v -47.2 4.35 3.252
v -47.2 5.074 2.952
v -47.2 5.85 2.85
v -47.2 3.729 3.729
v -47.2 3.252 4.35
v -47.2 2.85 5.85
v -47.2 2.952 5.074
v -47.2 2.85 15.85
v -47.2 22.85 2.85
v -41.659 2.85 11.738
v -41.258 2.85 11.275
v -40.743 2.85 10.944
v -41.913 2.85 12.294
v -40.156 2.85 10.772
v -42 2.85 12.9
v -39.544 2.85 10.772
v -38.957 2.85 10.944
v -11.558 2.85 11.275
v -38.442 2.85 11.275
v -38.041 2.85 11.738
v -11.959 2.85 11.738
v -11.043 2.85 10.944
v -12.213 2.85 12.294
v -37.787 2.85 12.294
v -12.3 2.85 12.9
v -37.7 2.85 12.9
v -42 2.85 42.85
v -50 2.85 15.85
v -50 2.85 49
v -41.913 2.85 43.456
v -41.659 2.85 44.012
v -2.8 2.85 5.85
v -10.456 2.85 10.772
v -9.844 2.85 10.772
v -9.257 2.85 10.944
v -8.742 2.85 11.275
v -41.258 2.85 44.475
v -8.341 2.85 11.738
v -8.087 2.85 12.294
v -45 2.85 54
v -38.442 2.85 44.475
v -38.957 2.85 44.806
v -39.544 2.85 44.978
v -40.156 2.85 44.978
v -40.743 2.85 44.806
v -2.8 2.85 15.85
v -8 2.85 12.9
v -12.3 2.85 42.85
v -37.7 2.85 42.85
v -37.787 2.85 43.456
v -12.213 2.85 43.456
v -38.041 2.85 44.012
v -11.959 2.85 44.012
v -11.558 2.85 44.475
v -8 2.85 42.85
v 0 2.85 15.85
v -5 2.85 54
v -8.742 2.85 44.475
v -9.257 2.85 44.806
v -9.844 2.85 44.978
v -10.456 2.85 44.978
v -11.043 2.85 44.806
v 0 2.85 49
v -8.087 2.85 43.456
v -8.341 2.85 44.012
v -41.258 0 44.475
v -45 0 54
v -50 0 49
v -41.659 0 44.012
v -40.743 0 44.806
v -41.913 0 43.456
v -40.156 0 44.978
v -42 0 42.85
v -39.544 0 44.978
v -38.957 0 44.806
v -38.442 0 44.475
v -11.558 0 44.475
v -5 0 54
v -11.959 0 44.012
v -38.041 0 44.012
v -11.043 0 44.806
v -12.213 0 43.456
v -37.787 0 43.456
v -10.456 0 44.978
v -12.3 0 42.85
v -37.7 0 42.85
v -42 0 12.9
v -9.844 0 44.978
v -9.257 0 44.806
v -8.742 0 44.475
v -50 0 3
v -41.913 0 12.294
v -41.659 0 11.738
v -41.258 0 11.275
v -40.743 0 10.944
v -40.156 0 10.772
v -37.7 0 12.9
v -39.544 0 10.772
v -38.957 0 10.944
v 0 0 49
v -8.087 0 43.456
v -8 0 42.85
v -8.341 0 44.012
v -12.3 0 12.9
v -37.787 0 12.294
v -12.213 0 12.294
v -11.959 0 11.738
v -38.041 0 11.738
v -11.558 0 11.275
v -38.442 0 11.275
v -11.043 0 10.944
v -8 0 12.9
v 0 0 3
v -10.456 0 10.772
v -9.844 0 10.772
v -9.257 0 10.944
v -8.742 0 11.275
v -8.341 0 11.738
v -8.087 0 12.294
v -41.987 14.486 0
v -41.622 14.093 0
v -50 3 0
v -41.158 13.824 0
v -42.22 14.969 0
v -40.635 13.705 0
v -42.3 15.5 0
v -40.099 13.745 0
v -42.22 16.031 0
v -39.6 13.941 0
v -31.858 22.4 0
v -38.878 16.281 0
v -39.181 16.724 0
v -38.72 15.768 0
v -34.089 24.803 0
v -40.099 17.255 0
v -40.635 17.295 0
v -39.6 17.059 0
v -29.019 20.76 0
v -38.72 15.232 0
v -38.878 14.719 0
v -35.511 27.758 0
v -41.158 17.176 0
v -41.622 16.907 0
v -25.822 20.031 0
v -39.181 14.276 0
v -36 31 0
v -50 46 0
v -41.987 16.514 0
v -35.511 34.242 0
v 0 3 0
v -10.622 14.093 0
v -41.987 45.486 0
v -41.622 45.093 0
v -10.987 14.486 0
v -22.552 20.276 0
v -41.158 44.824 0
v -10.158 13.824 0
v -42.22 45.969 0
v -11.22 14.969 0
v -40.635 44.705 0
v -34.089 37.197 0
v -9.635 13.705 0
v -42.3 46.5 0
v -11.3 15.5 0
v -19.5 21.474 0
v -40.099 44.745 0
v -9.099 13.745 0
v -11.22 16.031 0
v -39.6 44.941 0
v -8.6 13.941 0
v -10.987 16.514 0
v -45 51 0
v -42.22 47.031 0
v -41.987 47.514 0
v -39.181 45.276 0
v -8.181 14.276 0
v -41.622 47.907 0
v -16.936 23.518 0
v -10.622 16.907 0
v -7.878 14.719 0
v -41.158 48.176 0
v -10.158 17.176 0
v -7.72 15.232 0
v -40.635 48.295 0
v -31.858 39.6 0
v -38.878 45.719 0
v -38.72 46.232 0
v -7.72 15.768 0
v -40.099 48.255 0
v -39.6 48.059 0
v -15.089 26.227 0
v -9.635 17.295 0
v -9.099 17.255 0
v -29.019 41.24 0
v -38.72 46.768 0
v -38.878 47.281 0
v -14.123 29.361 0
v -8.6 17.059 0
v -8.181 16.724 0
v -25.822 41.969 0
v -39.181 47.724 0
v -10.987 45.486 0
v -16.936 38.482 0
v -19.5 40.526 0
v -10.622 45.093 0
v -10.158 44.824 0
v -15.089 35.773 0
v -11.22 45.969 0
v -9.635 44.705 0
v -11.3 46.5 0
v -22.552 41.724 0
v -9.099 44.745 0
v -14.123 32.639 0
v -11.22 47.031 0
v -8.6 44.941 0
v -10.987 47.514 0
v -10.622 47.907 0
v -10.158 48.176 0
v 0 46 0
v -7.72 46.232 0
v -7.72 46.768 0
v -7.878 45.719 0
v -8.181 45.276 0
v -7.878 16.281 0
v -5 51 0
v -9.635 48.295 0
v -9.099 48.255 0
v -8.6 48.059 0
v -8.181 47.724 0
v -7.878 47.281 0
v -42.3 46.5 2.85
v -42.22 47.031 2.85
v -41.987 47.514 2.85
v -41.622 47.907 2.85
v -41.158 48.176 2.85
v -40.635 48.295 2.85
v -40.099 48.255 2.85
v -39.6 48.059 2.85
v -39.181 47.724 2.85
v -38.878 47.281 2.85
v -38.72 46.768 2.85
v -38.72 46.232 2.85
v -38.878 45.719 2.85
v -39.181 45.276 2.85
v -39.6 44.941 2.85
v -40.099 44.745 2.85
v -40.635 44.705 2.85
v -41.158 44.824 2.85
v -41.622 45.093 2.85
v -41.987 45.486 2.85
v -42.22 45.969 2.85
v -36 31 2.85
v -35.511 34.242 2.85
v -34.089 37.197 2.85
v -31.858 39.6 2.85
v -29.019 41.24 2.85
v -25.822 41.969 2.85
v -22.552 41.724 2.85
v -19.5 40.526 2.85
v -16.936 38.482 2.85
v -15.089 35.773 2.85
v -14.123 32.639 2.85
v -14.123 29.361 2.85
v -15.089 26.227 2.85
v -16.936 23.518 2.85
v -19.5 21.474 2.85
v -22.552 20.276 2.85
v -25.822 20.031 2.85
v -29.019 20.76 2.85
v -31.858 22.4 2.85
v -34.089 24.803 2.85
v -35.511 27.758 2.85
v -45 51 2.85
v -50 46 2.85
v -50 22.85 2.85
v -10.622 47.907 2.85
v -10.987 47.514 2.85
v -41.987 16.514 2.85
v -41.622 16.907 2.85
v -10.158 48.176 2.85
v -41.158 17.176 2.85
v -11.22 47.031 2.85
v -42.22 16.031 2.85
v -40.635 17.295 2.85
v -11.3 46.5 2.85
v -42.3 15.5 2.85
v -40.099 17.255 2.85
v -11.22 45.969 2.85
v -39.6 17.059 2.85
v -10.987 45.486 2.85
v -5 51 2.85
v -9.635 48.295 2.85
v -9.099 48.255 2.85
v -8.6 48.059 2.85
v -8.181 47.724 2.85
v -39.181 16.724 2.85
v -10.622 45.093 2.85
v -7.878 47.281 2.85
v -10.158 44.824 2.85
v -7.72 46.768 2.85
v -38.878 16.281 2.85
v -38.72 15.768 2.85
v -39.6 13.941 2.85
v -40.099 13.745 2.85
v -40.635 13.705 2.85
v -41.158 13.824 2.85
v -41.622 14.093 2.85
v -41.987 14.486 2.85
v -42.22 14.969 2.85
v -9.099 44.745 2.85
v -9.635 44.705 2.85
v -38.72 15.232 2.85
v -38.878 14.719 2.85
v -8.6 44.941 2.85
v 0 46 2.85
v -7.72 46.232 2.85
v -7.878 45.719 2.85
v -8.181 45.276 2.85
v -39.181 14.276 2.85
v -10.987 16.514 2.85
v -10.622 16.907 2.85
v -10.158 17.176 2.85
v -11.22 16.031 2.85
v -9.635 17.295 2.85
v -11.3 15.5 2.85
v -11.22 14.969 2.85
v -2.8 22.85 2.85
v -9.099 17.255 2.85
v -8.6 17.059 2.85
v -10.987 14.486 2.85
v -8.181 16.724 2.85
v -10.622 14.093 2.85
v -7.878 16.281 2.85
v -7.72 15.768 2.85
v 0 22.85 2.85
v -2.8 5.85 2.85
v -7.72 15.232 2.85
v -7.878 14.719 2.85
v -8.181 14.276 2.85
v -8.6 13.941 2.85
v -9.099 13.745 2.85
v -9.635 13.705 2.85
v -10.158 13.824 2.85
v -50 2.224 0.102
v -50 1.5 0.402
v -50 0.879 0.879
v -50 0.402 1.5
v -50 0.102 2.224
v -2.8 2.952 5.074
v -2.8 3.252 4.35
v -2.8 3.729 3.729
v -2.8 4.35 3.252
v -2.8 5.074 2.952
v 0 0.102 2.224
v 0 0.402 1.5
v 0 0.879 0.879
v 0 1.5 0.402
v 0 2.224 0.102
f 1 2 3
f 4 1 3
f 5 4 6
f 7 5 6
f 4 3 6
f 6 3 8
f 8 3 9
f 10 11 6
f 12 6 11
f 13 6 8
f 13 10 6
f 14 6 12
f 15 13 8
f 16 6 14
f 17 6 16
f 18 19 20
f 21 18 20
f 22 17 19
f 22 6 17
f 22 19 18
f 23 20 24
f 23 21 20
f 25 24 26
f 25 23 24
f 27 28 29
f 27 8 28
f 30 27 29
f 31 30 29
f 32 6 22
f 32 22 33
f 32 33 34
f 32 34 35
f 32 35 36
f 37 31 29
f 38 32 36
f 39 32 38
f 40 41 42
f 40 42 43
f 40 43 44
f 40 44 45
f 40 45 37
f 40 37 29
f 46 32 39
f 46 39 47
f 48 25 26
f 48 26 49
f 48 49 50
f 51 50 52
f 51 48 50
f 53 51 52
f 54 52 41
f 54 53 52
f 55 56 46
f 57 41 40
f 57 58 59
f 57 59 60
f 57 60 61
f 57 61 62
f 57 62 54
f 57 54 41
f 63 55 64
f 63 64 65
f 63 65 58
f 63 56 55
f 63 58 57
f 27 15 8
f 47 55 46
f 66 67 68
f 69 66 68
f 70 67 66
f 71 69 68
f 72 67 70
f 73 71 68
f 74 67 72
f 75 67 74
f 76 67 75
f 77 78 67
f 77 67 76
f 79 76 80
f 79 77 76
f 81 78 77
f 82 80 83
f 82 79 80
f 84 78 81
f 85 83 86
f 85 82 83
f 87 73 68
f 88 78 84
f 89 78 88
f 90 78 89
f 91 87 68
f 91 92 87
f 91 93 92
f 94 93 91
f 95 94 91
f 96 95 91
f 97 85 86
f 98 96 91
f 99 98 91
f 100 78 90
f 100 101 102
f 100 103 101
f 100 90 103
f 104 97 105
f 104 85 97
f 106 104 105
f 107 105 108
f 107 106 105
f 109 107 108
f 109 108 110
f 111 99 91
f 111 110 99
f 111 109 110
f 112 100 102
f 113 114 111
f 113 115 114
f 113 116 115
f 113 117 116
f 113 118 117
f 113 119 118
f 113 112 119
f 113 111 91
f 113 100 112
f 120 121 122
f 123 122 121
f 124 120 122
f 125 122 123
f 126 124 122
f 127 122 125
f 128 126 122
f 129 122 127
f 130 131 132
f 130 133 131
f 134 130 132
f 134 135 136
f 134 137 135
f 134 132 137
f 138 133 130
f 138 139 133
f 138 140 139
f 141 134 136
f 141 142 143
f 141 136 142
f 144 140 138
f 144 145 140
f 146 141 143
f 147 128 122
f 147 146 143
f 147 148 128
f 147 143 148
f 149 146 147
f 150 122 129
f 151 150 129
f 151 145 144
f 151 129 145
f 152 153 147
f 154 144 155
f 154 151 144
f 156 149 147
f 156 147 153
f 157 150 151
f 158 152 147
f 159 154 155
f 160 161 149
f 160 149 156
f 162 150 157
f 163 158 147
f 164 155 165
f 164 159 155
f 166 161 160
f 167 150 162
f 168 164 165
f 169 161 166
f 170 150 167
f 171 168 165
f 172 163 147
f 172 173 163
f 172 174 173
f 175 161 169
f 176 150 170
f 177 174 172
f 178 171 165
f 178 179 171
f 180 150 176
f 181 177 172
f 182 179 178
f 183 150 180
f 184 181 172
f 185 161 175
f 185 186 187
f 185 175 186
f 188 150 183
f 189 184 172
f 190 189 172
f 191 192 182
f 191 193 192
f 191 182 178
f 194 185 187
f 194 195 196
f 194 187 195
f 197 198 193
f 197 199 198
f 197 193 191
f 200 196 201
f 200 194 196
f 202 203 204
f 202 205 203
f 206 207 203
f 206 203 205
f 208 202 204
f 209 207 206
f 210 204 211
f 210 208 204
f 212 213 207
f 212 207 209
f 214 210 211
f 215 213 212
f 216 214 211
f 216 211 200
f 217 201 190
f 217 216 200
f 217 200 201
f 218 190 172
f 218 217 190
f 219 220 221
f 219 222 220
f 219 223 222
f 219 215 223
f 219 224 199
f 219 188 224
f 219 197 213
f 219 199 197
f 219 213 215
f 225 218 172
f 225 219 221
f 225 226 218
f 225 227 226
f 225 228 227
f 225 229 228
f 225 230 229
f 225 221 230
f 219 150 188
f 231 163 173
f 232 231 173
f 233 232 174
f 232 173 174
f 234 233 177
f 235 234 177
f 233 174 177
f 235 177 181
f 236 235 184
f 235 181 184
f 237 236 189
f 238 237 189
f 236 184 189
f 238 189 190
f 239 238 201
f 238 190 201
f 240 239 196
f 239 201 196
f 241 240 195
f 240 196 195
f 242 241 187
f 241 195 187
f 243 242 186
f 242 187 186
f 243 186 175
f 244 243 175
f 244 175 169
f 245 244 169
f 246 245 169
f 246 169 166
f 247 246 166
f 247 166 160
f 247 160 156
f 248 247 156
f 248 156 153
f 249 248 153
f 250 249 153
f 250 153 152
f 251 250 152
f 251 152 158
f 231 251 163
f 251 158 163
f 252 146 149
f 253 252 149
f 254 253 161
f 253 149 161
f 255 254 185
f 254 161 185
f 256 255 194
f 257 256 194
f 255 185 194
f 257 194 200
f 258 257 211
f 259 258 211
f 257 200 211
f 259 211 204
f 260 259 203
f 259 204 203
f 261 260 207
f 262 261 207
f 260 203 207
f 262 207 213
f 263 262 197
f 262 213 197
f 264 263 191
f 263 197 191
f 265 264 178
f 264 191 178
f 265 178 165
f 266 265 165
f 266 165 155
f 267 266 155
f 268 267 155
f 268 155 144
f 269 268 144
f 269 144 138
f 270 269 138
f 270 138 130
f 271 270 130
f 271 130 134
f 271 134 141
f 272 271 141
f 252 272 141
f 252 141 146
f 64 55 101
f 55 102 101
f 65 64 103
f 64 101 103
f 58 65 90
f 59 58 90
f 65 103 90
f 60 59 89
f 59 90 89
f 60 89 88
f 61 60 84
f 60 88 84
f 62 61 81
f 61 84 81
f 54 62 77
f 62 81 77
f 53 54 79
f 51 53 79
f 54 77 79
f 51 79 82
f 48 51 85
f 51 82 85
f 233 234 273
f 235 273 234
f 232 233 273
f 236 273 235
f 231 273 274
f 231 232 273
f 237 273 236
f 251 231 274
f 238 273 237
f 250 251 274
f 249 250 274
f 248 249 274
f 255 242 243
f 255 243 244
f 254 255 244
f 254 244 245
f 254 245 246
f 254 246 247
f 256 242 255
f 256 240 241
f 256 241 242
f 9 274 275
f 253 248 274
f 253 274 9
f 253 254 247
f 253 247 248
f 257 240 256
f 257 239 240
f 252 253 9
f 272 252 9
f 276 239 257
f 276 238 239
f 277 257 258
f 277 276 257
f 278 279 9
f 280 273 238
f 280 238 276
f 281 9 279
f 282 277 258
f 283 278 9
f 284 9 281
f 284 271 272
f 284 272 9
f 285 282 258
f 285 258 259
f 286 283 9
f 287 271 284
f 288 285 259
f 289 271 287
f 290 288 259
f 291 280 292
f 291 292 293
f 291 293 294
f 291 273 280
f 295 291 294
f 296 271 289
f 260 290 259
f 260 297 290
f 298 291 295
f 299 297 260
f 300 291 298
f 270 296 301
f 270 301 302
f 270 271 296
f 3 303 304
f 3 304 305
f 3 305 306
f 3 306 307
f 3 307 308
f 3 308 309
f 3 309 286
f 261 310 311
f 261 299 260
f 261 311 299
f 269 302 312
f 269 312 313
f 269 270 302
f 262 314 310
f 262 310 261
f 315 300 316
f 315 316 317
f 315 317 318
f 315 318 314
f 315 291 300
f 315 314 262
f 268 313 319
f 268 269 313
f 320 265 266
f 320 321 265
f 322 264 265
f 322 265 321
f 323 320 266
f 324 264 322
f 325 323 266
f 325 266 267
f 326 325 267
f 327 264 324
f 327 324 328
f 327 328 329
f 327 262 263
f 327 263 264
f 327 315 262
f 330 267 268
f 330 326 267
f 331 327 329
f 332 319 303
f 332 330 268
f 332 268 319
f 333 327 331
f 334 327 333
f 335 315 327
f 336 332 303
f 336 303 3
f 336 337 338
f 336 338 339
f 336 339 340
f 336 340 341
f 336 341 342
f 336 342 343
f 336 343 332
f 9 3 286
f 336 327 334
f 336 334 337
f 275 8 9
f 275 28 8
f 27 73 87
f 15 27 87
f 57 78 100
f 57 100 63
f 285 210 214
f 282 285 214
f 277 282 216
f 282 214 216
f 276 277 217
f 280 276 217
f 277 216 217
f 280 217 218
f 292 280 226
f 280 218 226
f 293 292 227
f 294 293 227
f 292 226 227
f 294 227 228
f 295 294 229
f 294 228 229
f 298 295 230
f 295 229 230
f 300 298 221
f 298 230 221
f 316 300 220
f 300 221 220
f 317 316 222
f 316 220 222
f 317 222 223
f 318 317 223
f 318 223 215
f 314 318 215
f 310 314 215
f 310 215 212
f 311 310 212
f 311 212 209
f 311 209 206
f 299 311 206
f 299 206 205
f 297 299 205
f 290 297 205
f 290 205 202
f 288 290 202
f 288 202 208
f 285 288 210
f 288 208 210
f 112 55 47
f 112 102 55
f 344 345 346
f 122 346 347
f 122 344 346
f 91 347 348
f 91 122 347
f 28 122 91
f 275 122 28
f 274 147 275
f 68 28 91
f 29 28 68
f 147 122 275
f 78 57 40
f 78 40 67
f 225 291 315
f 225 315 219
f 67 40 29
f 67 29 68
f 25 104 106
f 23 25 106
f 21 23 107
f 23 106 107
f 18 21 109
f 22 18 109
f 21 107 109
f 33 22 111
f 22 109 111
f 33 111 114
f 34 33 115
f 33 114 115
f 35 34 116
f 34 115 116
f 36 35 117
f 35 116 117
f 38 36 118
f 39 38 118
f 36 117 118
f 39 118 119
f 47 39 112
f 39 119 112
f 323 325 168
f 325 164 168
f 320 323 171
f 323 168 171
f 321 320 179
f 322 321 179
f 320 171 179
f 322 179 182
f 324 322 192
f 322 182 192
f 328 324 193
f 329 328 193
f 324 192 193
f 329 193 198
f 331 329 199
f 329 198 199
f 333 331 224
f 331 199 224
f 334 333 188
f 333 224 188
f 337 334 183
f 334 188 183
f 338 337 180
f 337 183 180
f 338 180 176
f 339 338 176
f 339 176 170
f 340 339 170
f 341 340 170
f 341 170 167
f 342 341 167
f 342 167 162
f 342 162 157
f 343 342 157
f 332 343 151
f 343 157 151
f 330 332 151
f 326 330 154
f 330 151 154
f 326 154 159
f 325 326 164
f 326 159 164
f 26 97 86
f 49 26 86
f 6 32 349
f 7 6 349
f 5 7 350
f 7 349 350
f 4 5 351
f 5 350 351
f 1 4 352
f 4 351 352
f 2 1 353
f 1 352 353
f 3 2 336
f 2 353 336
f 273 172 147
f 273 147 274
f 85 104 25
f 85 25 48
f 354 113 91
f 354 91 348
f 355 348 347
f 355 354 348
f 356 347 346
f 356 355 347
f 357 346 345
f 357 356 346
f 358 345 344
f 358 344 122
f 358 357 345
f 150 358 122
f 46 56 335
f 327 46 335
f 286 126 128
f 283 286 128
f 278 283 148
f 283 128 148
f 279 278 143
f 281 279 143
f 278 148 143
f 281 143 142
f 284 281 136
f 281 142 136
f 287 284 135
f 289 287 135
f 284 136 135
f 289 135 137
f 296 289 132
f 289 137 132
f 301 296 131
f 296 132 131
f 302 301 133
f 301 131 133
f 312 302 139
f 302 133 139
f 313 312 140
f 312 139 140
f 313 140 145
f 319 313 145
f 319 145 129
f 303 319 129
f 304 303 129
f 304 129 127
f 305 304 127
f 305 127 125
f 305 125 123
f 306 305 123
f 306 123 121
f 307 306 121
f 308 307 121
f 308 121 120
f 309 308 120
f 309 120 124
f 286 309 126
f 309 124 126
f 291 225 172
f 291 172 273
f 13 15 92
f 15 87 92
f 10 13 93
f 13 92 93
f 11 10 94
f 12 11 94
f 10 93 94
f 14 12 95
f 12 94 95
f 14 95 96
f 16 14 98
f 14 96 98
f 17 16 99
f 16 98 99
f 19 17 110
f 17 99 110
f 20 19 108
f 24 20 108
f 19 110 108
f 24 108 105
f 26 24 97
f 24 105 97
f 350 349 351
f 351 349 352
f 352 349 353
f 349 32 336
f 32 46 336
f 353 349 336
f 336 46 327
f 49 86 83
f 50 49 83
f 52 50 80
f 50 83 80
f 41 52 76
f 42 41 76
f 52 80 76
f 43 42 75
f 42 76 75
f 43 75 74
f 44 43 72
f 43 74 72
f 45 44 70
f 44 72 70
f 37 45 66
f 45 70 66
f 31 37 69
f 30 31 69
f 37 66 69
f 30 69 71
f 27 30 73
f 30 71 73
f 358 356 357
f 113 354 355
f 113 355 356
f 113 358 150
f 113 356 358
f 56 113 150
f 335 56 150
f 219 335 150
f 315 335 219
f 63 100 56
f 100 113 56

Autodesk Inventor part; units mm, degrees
ref_plane "YZ Plane" through (0, 0, 0) normal (1, 0, 0) x (0, 1, 0)
ref_plane "XZ Plane" through (0, 0, 0) normal (0, 1, 0) x (-1, 0, 0)
ref_plane "XY Plane" through (0, 0, 0) normal (0, 0, 1) x (1, 0, 0)
sketch "Sketch1" plane through (0, 0, 0) normal (1, 0, 0) x (0, 1, 0)
  line L0 (3, 0) -> (51, 0)
  line L1 (51, 0) -> (51, 2.85)
  line L2 (51, 2.85) -> (5.85, 2.85)
  line L3 (2.85, 5.85) -> (2.85, 54)
  line L4 (2.85, 54) -> (0, 54)
  line L5 (0, 54) -> (0, 3)
  arc A0 (0, 3) -> (3, 0) centre (3, 3) ccw
  arc A1 (2.85, 5.85) -> (5.85, 2.85) centre (5.85, 5.85) ccw
  point P0 (0, 0)
  dimension "d0" = 51
  dimension "d1" = 2.85
  dimension "d2" = 2.85
  dimension "d3" = 54
  dimension "d4" = 3
extrude "Extrusion1" add sketch "Sketch1" against normal blind 50
sketch "Sketch2" plane through (0, 0, 0) normal (1, 0, 0) x (0, 0, -1)
  line L0 (-54, 2.85) -> (-54, 0) projected
  line L1 (-54, 0) -> (-3, 0) projected
  arc A0 (-3, 0) -> (0, 3) centre (-3, 3) ccw projected
  line L2 (0, 3) -> (0, 51) projected
  line L3 (0, 51) -> (-2.85, 51) projected
  line L4 (-2.85, 51) -> (-2.85, 5.85) projected
  arc A1 (-5.85, 2.85) -> (-2.85, 5.85) centre (-5.85, 5.85) ccw projected
  line L5 (-5.85, 2.85) -> (-54, 2.85) projected
  line L6 (-5.85, 2.85) -> (-54, 2.85) projected
  line L7 (-15.85, 2.85) -> (-2.85, 22.85)
  line L8 (-2.85, 51) -> (-2.85, 5.85) projected
  point P0 (0, 0)
  point P1 (-2.85, 22.85)
  dimension "d7" = 20
  dimension "d8" = 13
extrude "Extrusion2" add sketch "Sketch2" against normal blind 2.8 contours L7 L4 A1 L5
sketch "Sketch3" plane through (-50, 0, 0) normal (-1, 0, 0) x (0, 0, 1)
  line L0 (2.85, 5.85) -> (2.85, 22.85) projected
  arc A0 (2.85, 5.85) -> (5.85, 2.85) centre (5.85, 5.85) ccw projected
  line L1 (15.85, 2.85) -> (5.85, 2.85) projected
  line L2 (15.85, 2.85) -> (2.85, 22.85) projected
  point P0 (0, 0)
extrude "Extrusion3" add sketch "Sketch3" against normal blind 2.8
sketch "Sketch4" plane through (0, 3, 0) normal (0, 0, -1) x (-1, 0, 0)
  line L0 (0, 48) -> (50, 48) construction
  line L1 (25, 48) -> (25, -3) construction
  line L2 (0, -3) -> (50, -3) construction
  line L3 (0, 48) -> (0, 19.85) construction
  line L4 (0, 28) -> (50, 28) construction
  line L5 (50, 48) -> (50, 0) construction
  circle A0 centre (25, 28) radius 11
  line L6 (9.5, 43.5) -> (40.5, 43.5) construction
  line L7 (40.5, 43.5) -> (40.5, 12.5) construction
  line L8 (40.5, 12.5) -> (9.5, 12.5) construction
  line L9 (9.5, 12.5) -> (9.5, 43.5) construction
  circle A1 centre (9.5, 43.5) radius 1.8
  circle A2 centre (40.5, 43.5) radius 1.8
  circle A3 centre (40.5, 12.5) radius 1.8
  circle A4 centre (9.5, 12.5) radius 1.8
  dimension "d13" = 20
  dimension "d14" = 22
  dimension "d15" = 31
  dimension "d16" = 31
  dimension "d17" = 3.6
  dimension "d18" = 3.6
  dimension "d19" = 3.6
  dimension "d20" = 3.6
  dimension "d21" = 15.5
  dimension "d22" = 15.5
extrude "Extrusion4" cut sketch "Sketch4" against normal up to next
sketch "Sketch5" plane through (0, 0, 3) normal (0, -1, 0) x (1, 0, 0)
  line L0 (0, 51) -> (-50, 51) construction
  line L1 (-38.7, -3) -> (-42.3, -3) construction
  line L2 (-39.85, 51) -> (-39.85, -3.09) construction
  line L3 (0, -3) -> (-50, -3) construction
  line L4 (-50, 0) -> (-50, 51) construction
  line L5 (-25, 51) -> (-25, -3) construction
  line L6 (-39.85, 42) -> (-39.85, 7.75) construction
  line L7 (-42, 39.85) -> (-42, 9.9)
  line L8 (-37.7, 9.9) -> (-37.7, 39.85)
  arc A0 (-37.7, 39.85) -> (-42, 39.85) centre (-39.85, 39.85) ccw
  arc A1 (-42, 9.9) -> (-37.7, 9.9) centre (-39.85, 9.9) ccw
  line L9 (-10.15, 42) -> (-10.15, 7.75) construction
  line L10 (-8, 39.85) -> (-8, 9.9)
  line L11 (-12.3, 9.9) -> (-12.3, 39.85)
  arc A2 (-8, 39.85) -> (-12.3, 39.85) centre (-10.15, 39.85) ccw
  arc A3 (-12.3, 9.9) -> (-8, 9.9) centre (-10.15, 9.9) ccw
  point P0 (-39.85, 24.875)
  point P1 (-10.15, 24.875)
  dimension "d25" = 10.15
  dimension "d26" = 34.25
  dimension "d27" = 4.3
  dimension "d28" = 9
extrude "Extrusion5" cut sketch "Sketch5" against normal up to next
chamfer "Chamfer1" distance 5 angle 45 4 edges at (0, 1.425, 54) (-50, 1.425, 54) (-50, 51, 1.425) (0, 51, 1.425)
equation "\"d2\" = d1"
equation "\"d18\" = d17"
equation "\"d19\" = d17"
equation "\"d20\" = d17"
equation "\"d21\" = 0.5 * d15"
equation "\"d22\" = 0.5 * d16"
properties part number "Nema 17 Stepper Motor Mounting Bracket"
